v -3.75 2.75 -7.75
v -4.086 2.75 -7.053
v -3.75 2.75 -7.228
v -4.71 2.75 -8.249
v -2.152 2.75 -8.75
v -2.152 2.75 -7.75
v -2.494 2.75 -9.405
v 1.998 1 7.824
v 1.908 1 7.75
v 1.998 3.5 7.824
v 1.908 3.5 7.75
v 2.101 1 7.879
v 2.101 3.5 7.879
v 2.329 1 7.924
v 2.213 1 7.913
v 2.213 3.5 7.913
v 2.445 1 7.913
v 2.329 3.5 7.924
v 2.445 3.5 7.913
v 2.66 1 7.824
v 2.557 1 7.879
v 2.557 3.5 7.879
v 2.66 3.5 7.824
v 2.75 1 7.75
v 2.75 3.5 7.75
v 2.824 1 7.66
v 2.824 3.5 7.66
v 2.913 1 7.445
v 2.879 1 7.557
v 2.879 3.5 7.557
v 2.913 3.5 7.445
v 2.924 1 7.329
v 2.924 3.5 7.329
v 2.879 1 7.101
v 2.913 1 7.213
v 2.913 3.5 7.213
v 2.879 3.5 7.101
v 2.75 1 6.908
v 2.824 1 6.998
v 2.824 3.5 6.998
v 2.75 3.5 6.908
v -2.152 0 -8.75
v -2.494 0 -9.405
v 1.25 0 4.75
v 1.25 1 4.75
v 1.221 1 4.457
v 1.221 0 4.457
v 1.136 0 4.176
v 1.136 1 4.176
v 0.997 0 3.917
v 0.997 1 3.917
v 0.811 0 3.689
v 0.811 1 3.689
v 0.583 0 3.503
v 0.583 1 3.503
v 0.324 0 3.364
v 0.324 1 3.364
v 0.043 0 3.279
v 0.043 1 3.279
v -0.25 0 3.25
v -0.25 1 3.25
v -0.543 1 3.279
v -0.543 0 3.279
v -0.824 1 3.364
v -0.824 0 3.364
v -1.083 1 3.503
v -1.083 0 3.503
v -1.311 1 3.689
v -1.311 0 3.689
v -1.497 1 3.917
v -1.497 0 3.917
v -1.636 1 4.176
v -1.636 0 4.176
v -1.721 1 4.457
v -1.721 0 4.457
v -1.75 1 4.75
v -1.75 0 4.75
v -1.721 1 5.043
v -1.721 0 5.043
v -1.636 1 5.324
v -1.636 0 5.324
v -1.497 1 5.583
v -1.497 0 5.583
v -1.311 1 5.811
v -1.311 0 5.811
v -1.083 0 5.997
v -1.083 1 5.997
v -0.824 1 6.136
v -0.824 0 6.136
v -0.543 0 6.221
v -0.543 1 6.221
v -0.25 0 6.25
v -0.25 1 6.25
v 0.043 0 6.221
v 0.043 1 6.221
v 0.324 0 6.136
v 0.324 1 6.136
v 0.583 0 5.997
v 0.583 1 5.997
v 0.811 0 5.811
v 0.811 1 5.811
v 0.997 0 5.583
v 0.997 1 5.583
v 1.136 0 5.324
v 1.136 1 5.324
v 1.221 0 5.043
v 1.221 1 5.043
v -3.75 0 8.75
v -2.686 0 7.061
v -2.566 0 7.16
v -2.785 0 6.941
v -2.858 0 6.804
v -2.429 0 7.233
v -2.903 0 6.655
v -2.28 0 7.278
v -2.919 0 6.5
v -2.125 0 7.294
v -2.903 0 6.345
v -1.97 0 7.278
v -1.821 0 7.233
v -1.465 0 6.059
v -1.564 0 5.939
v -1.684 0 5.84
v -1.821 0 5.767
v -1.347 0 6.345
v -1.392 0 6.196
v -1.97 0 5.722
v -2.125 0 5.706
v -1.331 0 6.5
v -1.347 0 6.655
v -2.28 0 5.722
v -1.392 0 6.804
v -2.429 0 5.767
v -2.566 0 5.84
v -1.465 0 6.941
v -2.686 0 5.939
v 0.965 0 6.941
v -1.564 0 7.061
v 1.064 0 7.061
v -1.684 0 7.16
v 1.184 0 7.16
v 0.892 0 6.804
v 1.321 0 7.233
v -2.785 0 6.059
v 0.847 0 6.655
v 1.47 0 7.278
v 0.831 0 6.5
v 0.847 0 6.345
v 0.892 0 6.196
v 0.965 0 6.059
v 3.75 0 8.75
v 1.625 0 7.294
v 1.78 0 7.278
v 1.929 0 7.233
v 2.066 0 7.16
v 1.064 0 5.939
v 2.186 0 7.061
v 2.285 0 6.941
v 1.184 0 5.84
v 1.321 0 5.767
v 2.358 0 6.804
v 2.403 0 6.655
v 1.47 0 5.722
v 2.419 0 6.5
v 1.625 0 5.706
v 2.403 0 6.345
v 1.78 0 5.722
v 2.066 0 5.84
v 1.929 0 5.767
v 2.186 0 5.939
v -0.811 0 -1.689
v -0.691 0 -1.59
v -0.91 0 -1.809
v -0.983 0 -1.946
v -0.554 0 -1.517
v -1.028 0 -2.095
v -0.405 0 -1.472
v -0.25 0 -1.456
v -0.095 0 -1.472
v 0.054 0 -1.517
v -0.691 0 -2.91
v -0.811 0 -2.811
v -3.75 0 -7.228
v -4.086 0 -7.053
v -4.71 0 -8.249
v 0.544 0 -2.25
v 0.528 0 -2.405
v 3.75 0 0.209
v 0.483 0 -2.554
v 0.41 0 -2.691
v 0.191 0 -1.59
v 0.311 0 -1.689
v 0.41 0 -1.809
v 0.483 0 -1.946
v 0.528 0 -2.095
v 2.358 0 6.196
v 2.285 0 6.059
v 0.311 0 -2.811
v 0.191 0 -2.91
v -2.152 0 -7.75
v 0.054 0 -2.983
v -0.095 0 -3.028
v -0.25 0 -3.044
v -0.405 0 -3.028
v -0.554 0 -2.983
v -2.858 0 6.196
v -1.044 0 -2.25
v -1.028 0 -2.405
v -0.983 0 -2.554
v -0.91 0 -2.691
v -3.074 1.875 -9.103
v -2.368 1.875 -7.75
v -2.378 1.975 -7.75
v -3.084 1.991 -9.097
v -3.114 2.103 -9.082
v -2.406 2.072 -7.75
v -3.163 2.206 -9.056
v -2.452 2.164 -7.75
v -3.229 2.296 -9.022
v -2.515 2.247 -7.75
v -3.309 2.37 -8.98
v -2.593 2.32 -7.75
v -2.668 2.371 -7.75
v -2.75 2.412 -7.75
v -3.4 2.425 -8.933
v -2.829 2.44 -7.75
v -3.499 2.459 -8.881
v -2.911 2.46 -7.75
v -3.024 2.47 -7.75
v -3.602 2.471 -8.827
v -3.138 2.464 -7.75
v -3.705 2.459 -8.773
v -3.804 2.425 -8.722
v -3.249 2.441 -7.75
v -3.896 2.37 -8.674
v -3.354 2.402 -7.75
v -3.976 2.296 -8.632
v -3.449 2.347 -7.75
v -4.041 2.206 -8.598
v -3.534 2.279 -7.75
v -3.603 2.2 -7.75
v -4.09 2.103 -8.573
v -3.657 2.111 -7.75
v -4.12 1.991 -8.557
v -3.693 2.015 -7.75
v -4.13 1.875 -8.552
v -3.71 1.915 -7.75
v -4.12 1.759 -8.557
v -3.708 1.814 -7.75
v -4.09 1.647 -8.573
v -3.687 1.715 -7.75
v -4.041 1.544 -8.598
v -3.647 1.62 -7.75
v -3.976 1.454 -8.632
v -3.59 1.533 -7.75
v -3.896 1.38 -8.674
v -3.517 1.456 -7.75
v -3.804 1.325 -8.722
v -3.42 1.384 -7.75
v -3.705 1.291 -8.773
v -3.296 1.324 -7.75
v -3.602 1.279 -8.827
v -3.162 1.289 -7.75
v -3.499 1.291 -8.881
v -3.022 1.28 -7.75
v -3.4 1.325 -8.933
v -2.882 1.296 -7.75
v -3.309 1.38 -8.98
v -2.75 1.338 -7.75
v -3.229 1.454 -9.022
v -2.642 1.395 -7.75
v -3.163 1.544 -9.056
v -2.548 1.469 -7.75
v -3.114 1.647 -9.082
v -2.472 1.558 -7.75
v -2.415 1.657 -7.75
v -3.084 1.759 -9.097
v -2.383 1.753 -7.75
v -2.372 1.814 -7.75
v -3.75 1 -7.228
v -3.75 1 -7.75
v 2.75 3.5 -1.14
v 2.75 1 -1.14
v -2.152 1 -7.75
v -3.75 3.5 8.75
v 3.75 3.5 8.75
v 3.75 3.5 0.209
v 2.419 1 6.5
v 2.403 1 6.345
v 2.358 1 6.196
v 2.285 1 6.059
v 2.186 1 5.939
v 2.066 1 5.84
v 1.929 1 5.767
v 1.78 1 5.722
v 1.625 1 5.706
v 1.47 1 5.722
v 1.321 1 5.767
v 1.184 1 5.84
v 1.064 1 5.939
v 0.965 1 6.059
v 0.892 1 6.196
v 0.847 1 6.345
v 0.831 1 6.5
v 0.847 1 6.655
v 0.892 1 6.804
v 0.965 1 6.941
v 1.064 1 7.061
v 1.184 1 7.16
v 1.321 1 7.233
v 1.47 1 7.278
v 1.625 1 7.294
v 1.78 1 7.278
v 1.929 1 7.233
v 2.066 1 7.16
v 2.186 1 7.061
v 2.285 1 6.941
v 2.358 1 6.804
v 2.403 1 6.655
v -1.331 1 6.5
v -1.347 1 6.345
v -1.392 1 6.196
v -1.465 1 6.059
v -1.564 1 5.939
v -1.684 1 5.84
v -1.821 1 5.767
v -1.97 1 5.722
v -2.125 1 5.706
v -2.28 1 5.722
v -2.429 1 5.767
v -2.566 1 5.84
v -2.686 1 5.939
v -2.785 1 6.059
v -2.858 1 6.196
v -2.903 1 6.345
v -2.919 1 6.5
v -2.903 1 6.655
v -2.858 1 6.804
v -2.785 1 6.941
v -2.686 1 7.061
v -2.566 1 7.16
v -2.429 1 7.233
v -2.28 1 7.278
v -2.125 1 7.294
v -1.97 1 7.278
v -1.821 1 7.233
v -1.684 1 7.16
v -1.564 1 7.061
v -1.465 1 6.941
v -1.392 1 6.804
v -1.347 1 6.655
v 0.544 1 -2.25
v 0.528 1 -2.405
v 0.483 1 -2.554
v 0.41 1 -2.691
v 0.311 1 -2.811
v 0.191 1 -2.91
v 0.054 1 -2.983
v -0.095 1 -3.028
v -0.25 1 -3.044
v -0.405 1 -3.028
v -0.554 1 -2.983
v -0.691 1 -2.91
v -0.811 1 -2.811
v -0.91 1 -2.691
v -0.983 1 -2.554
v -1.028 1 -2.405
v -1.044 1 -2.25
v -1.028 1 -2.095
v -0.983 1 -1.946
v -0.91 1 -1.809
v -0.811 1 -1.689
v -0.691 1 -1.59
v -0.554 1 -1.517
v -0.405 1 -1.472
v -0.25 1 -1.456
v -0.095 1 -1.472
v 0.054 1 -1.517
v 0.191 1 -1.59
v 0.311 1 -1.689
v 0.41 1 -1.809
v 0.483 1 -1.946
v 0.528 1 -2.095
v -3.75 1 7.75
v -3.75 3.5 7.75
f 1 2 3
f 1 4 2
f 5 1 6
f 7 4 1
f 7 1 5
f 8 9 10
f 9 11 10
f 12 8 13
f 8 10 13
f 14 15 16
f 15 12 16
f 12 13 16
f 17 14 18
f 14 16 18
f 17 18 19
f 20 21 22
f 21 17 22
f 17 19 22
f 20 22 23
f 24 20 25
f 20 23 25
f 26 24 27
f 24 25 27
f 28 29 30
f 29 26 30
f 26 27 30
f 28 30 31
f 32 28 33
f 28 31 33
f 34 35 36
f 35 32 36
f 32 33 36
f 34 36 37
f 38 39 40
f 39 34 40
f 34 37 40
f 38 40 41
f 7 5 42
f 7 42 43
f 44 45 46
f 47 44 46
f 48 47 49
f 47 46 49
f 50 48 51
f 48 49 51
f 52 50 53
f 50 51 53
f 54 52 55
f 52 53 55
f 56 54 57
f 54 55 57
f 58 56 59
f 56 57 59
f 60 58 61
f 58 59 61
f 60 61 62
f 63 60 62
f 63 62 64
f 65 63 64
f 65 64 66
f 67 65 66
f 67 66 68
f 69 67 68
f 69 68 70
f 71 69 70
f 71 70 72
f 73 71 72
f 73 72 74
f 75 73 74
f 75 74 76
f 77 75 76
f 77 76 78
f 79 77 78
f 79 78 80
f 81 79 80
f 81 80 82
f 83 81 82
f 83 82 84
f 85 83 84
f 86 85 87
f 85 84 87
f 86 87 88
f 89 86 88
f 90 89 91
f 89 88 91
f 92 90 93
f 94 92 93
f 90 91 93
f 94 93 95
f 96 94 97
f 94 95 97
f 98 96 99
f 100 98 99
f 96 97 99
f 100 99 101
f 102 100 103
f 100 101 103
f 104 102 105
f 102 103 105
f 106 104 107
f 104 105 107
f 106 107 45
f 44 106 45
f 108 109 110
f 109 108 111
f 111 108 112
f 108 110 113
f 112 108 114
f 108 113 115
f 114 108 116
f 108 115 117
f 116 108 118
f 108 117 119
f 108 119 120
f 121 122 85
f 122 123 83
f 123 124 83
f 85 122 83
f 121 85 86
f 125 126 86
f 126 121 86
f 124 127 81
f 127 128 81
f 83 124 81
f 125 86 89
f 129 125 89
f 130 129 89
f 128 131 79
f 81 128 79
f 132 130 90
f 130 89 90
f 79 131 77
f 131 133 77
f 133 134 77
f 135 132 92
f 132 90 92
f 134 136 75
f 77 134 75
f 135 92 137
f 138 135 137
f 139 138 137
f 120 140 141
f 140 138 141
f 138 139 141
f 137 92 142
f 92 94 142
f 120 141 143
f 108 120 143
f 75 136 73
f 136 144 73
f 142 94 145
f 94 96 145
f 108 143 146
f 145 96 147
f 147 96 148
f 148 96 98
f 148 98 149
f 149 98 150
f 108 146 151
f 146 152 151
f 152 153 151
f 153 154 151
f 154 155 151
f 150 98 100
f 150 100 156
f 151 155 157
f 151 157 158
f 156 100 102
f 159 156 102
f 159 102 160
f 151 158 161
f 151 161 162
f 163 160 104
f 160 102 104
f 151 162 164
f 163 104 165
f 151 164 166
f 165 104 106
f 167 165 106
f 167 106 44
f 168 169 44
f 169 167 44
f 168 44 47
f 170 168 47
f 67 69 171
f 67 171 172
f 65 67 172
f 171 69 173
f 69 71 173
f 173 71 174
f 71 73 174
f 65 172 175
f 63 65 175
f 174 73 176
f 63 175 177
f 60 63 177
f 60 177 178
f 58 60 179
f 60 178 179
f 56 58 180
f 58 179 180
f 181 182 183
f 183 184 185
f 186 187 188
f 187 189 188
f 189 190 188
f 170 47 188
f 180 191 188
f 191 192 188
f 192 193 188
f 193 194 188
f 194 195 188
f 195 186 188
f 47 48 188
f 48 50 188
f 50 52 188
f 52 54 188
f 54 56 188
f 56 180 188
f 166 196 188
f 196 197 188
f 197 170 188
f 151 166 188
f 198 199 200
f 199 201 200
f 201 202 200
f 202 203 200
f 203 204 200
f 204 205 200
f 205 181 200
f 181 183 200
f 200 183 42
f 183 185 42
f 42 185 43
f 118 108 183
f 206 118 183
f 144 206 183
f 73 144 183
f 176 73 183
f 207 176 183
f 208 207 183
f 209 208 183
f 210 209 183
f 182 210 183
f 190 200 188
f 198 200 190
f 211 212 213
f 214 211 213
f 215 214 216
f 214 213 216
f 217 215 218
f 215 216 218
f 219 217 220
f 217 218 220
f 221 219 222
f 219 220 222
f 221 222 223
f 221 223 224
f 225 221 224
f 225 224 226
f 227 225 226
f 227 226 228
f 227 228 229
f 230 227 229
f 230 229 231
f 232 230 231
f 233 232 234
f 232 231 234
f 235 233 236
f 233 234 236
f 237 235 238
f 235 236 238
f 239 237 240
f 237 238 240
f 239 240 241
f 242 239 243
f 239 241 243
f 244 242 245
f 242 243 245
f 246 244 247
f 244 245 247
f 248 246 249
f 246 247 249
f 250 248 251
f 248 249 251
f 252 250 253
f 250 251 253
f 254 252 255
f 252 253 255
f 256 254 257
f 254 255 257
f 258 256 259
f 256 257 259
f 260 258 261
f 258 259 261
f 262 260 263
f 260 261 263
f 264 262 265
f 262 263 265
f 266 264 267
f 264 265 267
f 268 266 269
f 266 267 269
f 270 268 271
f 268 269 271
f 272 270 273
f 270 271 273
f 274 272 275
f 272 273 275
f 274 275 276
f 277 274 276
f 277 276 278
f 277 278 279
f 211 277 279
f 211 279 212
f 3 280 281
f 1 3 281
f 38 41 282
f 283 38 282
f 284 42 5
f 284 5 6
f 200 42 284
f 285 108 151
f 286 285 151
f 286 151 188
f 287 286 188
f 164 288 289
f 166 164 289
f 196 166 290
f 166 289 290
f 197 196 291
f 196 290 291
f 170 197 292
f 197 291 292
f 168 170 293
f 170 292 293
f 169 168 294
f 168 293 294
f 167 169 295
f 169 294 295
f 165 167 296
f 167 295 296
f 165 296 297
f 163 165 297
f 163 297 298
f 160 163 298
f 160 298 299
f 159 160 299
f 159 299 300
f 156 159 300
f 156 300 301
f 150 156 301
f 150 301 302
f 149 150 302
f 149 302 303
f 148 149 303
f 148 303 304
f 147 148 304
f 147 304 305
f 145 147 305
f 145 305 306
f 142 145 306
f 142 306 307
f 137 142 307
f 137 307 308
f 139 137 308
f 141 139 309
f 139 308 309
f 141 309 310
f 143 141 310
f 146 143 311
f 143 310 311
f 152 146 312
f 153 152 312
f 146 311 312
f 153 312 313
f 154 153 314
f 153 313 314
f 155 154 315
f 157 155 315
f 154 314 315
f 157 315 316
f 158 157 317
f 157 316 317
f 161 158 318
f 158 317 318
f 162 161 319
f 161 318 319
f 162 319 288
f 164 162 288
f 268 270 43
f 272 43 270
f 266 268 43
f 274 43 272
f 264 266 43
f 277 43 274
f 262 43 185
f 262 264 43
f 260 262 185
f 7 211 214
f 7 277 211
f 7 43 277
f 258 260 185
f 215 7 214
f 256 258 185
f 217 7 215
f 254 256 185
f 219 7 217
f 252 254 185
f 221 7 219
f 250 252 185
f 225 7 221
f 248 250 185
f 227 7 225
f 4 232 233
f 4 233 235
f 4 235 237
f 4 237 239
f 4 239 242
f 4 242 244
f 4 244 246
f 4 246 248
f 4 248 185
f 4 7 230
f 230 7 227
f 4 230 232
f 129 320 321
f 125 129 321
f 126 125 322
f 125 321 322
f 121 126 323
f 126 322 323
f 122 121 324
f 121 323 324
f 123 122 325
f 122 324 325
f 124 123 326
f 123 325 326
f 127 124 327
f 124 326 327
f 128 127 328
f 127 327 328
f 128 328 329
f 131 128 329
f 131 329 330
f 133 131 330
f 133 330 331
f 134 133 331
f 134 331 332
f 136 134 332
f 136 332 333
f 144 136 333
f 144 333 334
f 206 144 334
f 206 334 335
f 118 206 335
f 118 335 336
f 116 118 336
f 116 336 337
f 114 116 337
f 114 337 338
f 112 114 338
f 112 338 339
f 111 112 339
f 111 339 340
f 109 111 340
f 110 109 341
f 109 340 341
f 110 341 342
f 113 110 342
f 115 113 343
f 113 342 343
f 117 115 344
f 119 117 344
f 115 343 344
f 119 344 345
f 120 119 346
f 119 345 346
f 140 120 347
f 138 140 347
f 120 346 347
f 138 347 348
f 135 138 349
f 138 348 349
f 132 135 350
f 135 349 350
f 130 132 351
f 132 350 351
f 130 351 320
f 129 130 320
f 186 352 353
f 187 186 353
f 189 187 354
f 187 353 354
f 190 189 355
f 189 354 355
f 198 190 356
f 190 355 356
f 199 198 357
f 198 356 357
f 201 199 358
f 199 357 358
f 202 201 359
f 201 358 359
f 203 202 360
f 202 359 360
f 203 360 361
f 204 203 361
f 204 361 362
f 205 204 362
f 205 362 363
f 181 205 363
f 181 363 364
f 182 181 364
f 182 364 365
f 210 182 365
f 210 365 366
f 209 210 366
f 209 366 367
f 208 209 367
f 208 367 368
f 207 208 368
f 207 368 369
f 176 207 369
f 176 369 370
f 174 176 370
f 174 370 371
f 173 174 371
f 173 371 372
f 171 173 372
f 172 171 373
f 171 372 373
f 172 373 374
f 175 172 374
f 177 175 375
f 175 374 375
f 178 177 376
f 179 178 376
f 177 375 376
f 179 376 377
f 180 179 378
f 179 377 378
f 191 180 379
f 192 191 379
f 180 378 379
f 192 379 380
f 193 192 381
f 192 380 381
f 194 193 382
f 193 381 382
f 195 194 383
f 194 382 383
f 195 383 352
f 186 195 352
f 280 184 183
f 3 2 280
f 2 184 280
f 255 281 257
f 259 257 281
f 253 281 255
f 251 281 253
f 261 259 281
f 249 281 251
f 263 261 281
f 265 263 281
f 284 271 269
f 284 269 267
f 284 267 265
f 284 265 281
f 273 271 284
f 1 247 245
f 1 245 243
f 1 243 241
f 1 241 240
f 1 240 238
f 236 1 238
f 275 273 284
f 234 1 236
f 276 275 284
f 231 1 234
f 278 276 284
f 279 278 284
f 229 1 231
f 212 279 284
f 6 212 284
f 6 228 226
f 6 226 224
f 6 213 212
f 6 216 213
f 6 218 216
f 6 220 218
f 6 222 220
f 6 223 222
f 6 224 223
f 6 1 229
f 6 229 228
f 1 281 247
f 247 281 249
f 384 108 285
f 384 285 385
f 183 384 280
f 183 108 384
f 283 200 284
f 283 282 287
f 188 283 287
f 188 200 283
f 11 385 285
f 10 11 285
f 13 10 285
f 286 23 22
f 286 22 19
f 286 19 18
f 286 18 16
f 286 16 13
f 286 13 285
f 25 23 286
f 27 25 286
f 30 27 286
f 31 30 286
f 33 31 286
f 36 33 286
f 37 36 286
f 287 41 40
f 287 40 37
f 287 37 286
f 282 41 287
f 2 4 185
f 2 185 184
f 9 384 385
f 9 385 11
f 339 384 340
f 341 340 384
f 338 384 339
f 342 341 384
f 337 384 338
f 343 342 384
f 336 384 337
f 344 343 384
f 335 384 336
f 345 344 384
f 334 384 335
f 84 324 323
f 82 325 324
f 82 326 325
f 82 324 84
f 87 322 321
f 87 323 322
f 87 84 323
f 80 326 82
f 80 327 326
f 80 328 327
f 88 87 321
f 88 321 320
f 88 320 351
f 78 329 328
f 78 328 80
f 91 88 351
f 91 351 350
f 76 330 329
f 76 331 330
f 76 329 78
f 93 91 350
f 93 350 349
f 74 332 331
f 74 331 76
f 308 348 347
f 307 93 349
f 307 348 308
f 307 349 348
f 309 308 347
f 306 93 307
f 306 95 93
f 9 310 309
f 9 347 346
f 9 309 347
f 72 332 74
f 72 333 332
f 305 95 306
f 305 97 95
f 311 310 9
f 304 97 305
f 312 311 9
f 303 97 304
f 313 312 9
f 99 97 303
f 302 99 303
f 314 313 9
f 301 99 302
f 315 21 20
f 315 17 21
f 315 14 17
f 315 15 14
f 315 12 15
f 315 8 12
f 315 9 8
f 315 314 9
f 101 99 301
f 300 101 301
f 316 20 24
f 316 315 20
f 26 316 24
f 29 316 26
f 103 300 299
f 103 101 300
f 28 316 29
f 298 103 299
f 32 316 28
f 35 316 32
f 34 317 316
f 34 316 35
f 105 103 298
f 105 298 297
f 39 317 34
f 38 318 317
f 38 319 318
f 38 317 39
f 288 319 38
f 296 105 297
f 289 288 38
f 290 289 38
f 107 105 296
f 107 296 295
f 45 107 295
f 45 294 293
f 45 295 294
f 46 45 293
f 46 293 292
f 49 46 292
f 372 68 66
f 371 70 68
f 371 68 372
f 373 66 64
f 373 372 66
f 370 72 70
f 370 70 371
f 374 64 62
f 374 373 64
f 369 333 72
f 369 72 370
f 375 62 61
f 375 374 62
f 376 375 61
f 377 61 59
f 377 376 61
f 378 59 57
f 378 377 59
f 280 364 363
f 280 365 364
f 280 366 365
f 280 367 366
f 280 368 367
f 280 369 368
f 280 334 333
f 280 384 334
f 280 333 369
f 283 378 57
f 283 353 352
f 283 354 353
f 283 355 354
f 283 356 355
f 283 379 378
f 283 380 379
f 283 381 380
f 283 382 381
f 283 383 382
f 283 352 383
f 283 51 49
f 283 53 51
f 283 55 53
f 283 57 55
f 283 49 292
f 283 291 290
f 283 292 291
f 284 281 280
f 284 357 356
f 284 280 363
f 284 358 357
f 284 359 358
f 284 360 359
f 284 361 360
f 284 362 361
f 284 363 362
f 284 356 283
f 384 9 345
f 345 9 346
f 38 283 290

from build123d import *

# Parameters (mm, degrees)
SKETCH1_W                     = 7.5
SKETCH1_H                     = 17.5
BOSS_EXTRUDE1_DEPTH           = 3.5
SKETCH2_W                     = 5.5
SKETCH2_H                     = 15.5
CUT_EXTRUDE1_DEPTH            = 2.5
SKETCH3_R                     = 1.5
GRIN_HOLE_DEPTH               = 2
SKETCH6_R                     = 0.5953125
CORNER_DIVOT_DEPTH            = 2.5
SKETCH7_R                     = 0.79375
MAGNET_HOLES_DEPTH            = 2
BOSS_EXTRUDE2_DEPTH           = 3.5
SKETCH14_W                    = 5.965258944
SKETCH14_H                    = 5.132960456
SET_SCREW_EXTENSION_DEPTH     = 0.75
TAP_DRILL_FOR_0_80_TAP1_D     = 1.19126
TAP_DRILL_FOR_0_80_TAP1_DEPTH = 7.11
TAP_DRILL_FOR_0_80_TAP1_TIP   = 0.357890611
DIAGONAL_CUT_DEPTH            = 5
SKETCH16_W                    = 1
SKETCH16_H                    = 15.5
VERTICAL_CUT_DEPTH            = 3


with BuildPart() as part:
    # Sketch1 → Boss-Extrude1 (new body)
    with BuildSketch(Plane(origin=(0, 0, 0), x_dir=(1, 0, 0), z_dir=(0, 1, 0))):
        Rectangle(SKETCH1_W, SKETCH1_H)
    extrude(amount=BOSS_EXTRUDE1_DEPTH)

    # Sketch2 → Cut-Extrude1 (cut)
    with BuildSketch(Plane(origin=(0, 3.5, 0), x_dir=(1, 0, 0), z_dir=(0, 1, 0))):
        Rectangle(SKETCH2_W, SKETCH2_H)
    extrude(amount=-CUT_EXTRUDE1_DEPTH, mode=Mode.SUBTRACT)

    # Sketch3 → GRIN Hole (cut, through all)
    with BuildSketch(Plane(origin=(0, 1, 0), x_dir=(1, 0, 0), z_dir=(0, 1, 0))):
        with Locations((-0.25, -4.75)):
            Circle(SKETCH3_R)
    extrude(amount=-GRIN_HOLE_DEPTH, mode=Mode.SUBTRACT)

    # Sketch6 → Corner divot (cut)
    with BuildSketch(Plane(origin=(0, 3.5, 0), x_dir=(1, 0, 0), z_dir=(0, 1, 0))):
        with Locations((2.329050494, -7.329050494)):
            Circle(SKETCH6_R)
    extrude(amount=-CORNER_DIVOT_DEPTH, mode=Mode.SUBTRACT)

    # Sketch7 → Magnet Holes (cut, through all)
    with BuildSketch(Plane(origin=(0, 1, 0), x_dir=(1, 0, 0), z_dir=(0, 1, 0))):
        with Locations((-0.25, 2.25)):
            Circle(SKETCH7_R)
        with Locations((-2.125, -6.5)):
            Circle(SKETCH7_R)
        with Locations((1.625, -6.5)):
            Circle(SKETCH7_R)
    extrude(amount=-MAGNET_HOLES_DEPTH, mode=Mode.SUBTRACT)

    # Sketch9 → Boss-Extrude2 (add)
    with BuildSketch(Plane(origin=(0, 3.5, 0), x_dir=(1, 0, 0), z_dir=(0, 1, 0))):
        Polygon((-2.493978672, 9.405385289), (-4.710390263, 8.248873438), (-4.086258113, 7.05274758), (-3.457701518, 7.380725089), (-2.498403119, 7.881281923), (-1.869846523, 8.209259431), align=None)
    extrude(amount=-BOSS_EXTRUDE2_DEPTH)

    # Sketch14 → Set Screw Extension (cut)
    with BuildSketch(Plane(origin=(0, 3.5, 0), x_dir=(1, 0, 0), z_dir=(0, 1, 0))):
        with Locations((-2.75, 7.75)):
            Rectangle(SKETCH14_W, SKETCH14_H)
    extrude(amount=-SET_SCREW_EXTENSION_DEPTH, mode=Mode.SUBTRACT)

    # Tap Drill for #0-80 Tap1
    with Locations(Plane(origin=(-4.391140577, 0, -8.415456236), x_dir=(-0.886564636, 0, 0.46260474), z_dir=(-0.46260474, 0, -0.886564636))):
        with Locations((-0.889902526, 1.875)):
            Hole(TAP_DRILL_FOR_0_80_TAP1_D / 2, depth=TAP_DRILL_FOR_0_80_TAP1_DEPTH)
            with Locations((0, 0, -(TAP_DRILL_FOR_0_80_TAP1_DEPTH + TAP_DRILL_FOR_0_80_TAP1_TIP / 2))):  # 118° drill point
                Cone(0, TAP_DRILL_FOR_0_80_TAP1_D / 2, TAP_DRILL_FOR_0_80_TAP1_TIP, mode=Mode.SUBTRACT)

    # Sketch15 → Diagonal Cut (cut)
    with BuildSketch(Plane(origin=(0, 0, 0), x_dir=(1, 0, 0), z_dir=(0, 1, 0))):
        Polygon((-2.152002093, 9.313235547), (-2.152002093, 7.75), (3.75, -0.208562074), (3.75, 9.313235547), align=None)
    extrude(amount=DIAGONAL_CUT_DEPTH, mode=Mode.SUBTRACT)

    # Sketch16 → Vertical Cut (cut)
    with BuildSketch(Plane(origin=(0, 1, 0), x_dir=(1, 0, 0), z_dir=(0, 1, 0))):
        with Locations((-3.25, 0)):
            Rectangle(SKETCH16_W, SKETCH16_H)
    extrude(amount=VERTICAL_CUT_DEPTH, mode=Mode.SUBTRACT)


solid = part.part
